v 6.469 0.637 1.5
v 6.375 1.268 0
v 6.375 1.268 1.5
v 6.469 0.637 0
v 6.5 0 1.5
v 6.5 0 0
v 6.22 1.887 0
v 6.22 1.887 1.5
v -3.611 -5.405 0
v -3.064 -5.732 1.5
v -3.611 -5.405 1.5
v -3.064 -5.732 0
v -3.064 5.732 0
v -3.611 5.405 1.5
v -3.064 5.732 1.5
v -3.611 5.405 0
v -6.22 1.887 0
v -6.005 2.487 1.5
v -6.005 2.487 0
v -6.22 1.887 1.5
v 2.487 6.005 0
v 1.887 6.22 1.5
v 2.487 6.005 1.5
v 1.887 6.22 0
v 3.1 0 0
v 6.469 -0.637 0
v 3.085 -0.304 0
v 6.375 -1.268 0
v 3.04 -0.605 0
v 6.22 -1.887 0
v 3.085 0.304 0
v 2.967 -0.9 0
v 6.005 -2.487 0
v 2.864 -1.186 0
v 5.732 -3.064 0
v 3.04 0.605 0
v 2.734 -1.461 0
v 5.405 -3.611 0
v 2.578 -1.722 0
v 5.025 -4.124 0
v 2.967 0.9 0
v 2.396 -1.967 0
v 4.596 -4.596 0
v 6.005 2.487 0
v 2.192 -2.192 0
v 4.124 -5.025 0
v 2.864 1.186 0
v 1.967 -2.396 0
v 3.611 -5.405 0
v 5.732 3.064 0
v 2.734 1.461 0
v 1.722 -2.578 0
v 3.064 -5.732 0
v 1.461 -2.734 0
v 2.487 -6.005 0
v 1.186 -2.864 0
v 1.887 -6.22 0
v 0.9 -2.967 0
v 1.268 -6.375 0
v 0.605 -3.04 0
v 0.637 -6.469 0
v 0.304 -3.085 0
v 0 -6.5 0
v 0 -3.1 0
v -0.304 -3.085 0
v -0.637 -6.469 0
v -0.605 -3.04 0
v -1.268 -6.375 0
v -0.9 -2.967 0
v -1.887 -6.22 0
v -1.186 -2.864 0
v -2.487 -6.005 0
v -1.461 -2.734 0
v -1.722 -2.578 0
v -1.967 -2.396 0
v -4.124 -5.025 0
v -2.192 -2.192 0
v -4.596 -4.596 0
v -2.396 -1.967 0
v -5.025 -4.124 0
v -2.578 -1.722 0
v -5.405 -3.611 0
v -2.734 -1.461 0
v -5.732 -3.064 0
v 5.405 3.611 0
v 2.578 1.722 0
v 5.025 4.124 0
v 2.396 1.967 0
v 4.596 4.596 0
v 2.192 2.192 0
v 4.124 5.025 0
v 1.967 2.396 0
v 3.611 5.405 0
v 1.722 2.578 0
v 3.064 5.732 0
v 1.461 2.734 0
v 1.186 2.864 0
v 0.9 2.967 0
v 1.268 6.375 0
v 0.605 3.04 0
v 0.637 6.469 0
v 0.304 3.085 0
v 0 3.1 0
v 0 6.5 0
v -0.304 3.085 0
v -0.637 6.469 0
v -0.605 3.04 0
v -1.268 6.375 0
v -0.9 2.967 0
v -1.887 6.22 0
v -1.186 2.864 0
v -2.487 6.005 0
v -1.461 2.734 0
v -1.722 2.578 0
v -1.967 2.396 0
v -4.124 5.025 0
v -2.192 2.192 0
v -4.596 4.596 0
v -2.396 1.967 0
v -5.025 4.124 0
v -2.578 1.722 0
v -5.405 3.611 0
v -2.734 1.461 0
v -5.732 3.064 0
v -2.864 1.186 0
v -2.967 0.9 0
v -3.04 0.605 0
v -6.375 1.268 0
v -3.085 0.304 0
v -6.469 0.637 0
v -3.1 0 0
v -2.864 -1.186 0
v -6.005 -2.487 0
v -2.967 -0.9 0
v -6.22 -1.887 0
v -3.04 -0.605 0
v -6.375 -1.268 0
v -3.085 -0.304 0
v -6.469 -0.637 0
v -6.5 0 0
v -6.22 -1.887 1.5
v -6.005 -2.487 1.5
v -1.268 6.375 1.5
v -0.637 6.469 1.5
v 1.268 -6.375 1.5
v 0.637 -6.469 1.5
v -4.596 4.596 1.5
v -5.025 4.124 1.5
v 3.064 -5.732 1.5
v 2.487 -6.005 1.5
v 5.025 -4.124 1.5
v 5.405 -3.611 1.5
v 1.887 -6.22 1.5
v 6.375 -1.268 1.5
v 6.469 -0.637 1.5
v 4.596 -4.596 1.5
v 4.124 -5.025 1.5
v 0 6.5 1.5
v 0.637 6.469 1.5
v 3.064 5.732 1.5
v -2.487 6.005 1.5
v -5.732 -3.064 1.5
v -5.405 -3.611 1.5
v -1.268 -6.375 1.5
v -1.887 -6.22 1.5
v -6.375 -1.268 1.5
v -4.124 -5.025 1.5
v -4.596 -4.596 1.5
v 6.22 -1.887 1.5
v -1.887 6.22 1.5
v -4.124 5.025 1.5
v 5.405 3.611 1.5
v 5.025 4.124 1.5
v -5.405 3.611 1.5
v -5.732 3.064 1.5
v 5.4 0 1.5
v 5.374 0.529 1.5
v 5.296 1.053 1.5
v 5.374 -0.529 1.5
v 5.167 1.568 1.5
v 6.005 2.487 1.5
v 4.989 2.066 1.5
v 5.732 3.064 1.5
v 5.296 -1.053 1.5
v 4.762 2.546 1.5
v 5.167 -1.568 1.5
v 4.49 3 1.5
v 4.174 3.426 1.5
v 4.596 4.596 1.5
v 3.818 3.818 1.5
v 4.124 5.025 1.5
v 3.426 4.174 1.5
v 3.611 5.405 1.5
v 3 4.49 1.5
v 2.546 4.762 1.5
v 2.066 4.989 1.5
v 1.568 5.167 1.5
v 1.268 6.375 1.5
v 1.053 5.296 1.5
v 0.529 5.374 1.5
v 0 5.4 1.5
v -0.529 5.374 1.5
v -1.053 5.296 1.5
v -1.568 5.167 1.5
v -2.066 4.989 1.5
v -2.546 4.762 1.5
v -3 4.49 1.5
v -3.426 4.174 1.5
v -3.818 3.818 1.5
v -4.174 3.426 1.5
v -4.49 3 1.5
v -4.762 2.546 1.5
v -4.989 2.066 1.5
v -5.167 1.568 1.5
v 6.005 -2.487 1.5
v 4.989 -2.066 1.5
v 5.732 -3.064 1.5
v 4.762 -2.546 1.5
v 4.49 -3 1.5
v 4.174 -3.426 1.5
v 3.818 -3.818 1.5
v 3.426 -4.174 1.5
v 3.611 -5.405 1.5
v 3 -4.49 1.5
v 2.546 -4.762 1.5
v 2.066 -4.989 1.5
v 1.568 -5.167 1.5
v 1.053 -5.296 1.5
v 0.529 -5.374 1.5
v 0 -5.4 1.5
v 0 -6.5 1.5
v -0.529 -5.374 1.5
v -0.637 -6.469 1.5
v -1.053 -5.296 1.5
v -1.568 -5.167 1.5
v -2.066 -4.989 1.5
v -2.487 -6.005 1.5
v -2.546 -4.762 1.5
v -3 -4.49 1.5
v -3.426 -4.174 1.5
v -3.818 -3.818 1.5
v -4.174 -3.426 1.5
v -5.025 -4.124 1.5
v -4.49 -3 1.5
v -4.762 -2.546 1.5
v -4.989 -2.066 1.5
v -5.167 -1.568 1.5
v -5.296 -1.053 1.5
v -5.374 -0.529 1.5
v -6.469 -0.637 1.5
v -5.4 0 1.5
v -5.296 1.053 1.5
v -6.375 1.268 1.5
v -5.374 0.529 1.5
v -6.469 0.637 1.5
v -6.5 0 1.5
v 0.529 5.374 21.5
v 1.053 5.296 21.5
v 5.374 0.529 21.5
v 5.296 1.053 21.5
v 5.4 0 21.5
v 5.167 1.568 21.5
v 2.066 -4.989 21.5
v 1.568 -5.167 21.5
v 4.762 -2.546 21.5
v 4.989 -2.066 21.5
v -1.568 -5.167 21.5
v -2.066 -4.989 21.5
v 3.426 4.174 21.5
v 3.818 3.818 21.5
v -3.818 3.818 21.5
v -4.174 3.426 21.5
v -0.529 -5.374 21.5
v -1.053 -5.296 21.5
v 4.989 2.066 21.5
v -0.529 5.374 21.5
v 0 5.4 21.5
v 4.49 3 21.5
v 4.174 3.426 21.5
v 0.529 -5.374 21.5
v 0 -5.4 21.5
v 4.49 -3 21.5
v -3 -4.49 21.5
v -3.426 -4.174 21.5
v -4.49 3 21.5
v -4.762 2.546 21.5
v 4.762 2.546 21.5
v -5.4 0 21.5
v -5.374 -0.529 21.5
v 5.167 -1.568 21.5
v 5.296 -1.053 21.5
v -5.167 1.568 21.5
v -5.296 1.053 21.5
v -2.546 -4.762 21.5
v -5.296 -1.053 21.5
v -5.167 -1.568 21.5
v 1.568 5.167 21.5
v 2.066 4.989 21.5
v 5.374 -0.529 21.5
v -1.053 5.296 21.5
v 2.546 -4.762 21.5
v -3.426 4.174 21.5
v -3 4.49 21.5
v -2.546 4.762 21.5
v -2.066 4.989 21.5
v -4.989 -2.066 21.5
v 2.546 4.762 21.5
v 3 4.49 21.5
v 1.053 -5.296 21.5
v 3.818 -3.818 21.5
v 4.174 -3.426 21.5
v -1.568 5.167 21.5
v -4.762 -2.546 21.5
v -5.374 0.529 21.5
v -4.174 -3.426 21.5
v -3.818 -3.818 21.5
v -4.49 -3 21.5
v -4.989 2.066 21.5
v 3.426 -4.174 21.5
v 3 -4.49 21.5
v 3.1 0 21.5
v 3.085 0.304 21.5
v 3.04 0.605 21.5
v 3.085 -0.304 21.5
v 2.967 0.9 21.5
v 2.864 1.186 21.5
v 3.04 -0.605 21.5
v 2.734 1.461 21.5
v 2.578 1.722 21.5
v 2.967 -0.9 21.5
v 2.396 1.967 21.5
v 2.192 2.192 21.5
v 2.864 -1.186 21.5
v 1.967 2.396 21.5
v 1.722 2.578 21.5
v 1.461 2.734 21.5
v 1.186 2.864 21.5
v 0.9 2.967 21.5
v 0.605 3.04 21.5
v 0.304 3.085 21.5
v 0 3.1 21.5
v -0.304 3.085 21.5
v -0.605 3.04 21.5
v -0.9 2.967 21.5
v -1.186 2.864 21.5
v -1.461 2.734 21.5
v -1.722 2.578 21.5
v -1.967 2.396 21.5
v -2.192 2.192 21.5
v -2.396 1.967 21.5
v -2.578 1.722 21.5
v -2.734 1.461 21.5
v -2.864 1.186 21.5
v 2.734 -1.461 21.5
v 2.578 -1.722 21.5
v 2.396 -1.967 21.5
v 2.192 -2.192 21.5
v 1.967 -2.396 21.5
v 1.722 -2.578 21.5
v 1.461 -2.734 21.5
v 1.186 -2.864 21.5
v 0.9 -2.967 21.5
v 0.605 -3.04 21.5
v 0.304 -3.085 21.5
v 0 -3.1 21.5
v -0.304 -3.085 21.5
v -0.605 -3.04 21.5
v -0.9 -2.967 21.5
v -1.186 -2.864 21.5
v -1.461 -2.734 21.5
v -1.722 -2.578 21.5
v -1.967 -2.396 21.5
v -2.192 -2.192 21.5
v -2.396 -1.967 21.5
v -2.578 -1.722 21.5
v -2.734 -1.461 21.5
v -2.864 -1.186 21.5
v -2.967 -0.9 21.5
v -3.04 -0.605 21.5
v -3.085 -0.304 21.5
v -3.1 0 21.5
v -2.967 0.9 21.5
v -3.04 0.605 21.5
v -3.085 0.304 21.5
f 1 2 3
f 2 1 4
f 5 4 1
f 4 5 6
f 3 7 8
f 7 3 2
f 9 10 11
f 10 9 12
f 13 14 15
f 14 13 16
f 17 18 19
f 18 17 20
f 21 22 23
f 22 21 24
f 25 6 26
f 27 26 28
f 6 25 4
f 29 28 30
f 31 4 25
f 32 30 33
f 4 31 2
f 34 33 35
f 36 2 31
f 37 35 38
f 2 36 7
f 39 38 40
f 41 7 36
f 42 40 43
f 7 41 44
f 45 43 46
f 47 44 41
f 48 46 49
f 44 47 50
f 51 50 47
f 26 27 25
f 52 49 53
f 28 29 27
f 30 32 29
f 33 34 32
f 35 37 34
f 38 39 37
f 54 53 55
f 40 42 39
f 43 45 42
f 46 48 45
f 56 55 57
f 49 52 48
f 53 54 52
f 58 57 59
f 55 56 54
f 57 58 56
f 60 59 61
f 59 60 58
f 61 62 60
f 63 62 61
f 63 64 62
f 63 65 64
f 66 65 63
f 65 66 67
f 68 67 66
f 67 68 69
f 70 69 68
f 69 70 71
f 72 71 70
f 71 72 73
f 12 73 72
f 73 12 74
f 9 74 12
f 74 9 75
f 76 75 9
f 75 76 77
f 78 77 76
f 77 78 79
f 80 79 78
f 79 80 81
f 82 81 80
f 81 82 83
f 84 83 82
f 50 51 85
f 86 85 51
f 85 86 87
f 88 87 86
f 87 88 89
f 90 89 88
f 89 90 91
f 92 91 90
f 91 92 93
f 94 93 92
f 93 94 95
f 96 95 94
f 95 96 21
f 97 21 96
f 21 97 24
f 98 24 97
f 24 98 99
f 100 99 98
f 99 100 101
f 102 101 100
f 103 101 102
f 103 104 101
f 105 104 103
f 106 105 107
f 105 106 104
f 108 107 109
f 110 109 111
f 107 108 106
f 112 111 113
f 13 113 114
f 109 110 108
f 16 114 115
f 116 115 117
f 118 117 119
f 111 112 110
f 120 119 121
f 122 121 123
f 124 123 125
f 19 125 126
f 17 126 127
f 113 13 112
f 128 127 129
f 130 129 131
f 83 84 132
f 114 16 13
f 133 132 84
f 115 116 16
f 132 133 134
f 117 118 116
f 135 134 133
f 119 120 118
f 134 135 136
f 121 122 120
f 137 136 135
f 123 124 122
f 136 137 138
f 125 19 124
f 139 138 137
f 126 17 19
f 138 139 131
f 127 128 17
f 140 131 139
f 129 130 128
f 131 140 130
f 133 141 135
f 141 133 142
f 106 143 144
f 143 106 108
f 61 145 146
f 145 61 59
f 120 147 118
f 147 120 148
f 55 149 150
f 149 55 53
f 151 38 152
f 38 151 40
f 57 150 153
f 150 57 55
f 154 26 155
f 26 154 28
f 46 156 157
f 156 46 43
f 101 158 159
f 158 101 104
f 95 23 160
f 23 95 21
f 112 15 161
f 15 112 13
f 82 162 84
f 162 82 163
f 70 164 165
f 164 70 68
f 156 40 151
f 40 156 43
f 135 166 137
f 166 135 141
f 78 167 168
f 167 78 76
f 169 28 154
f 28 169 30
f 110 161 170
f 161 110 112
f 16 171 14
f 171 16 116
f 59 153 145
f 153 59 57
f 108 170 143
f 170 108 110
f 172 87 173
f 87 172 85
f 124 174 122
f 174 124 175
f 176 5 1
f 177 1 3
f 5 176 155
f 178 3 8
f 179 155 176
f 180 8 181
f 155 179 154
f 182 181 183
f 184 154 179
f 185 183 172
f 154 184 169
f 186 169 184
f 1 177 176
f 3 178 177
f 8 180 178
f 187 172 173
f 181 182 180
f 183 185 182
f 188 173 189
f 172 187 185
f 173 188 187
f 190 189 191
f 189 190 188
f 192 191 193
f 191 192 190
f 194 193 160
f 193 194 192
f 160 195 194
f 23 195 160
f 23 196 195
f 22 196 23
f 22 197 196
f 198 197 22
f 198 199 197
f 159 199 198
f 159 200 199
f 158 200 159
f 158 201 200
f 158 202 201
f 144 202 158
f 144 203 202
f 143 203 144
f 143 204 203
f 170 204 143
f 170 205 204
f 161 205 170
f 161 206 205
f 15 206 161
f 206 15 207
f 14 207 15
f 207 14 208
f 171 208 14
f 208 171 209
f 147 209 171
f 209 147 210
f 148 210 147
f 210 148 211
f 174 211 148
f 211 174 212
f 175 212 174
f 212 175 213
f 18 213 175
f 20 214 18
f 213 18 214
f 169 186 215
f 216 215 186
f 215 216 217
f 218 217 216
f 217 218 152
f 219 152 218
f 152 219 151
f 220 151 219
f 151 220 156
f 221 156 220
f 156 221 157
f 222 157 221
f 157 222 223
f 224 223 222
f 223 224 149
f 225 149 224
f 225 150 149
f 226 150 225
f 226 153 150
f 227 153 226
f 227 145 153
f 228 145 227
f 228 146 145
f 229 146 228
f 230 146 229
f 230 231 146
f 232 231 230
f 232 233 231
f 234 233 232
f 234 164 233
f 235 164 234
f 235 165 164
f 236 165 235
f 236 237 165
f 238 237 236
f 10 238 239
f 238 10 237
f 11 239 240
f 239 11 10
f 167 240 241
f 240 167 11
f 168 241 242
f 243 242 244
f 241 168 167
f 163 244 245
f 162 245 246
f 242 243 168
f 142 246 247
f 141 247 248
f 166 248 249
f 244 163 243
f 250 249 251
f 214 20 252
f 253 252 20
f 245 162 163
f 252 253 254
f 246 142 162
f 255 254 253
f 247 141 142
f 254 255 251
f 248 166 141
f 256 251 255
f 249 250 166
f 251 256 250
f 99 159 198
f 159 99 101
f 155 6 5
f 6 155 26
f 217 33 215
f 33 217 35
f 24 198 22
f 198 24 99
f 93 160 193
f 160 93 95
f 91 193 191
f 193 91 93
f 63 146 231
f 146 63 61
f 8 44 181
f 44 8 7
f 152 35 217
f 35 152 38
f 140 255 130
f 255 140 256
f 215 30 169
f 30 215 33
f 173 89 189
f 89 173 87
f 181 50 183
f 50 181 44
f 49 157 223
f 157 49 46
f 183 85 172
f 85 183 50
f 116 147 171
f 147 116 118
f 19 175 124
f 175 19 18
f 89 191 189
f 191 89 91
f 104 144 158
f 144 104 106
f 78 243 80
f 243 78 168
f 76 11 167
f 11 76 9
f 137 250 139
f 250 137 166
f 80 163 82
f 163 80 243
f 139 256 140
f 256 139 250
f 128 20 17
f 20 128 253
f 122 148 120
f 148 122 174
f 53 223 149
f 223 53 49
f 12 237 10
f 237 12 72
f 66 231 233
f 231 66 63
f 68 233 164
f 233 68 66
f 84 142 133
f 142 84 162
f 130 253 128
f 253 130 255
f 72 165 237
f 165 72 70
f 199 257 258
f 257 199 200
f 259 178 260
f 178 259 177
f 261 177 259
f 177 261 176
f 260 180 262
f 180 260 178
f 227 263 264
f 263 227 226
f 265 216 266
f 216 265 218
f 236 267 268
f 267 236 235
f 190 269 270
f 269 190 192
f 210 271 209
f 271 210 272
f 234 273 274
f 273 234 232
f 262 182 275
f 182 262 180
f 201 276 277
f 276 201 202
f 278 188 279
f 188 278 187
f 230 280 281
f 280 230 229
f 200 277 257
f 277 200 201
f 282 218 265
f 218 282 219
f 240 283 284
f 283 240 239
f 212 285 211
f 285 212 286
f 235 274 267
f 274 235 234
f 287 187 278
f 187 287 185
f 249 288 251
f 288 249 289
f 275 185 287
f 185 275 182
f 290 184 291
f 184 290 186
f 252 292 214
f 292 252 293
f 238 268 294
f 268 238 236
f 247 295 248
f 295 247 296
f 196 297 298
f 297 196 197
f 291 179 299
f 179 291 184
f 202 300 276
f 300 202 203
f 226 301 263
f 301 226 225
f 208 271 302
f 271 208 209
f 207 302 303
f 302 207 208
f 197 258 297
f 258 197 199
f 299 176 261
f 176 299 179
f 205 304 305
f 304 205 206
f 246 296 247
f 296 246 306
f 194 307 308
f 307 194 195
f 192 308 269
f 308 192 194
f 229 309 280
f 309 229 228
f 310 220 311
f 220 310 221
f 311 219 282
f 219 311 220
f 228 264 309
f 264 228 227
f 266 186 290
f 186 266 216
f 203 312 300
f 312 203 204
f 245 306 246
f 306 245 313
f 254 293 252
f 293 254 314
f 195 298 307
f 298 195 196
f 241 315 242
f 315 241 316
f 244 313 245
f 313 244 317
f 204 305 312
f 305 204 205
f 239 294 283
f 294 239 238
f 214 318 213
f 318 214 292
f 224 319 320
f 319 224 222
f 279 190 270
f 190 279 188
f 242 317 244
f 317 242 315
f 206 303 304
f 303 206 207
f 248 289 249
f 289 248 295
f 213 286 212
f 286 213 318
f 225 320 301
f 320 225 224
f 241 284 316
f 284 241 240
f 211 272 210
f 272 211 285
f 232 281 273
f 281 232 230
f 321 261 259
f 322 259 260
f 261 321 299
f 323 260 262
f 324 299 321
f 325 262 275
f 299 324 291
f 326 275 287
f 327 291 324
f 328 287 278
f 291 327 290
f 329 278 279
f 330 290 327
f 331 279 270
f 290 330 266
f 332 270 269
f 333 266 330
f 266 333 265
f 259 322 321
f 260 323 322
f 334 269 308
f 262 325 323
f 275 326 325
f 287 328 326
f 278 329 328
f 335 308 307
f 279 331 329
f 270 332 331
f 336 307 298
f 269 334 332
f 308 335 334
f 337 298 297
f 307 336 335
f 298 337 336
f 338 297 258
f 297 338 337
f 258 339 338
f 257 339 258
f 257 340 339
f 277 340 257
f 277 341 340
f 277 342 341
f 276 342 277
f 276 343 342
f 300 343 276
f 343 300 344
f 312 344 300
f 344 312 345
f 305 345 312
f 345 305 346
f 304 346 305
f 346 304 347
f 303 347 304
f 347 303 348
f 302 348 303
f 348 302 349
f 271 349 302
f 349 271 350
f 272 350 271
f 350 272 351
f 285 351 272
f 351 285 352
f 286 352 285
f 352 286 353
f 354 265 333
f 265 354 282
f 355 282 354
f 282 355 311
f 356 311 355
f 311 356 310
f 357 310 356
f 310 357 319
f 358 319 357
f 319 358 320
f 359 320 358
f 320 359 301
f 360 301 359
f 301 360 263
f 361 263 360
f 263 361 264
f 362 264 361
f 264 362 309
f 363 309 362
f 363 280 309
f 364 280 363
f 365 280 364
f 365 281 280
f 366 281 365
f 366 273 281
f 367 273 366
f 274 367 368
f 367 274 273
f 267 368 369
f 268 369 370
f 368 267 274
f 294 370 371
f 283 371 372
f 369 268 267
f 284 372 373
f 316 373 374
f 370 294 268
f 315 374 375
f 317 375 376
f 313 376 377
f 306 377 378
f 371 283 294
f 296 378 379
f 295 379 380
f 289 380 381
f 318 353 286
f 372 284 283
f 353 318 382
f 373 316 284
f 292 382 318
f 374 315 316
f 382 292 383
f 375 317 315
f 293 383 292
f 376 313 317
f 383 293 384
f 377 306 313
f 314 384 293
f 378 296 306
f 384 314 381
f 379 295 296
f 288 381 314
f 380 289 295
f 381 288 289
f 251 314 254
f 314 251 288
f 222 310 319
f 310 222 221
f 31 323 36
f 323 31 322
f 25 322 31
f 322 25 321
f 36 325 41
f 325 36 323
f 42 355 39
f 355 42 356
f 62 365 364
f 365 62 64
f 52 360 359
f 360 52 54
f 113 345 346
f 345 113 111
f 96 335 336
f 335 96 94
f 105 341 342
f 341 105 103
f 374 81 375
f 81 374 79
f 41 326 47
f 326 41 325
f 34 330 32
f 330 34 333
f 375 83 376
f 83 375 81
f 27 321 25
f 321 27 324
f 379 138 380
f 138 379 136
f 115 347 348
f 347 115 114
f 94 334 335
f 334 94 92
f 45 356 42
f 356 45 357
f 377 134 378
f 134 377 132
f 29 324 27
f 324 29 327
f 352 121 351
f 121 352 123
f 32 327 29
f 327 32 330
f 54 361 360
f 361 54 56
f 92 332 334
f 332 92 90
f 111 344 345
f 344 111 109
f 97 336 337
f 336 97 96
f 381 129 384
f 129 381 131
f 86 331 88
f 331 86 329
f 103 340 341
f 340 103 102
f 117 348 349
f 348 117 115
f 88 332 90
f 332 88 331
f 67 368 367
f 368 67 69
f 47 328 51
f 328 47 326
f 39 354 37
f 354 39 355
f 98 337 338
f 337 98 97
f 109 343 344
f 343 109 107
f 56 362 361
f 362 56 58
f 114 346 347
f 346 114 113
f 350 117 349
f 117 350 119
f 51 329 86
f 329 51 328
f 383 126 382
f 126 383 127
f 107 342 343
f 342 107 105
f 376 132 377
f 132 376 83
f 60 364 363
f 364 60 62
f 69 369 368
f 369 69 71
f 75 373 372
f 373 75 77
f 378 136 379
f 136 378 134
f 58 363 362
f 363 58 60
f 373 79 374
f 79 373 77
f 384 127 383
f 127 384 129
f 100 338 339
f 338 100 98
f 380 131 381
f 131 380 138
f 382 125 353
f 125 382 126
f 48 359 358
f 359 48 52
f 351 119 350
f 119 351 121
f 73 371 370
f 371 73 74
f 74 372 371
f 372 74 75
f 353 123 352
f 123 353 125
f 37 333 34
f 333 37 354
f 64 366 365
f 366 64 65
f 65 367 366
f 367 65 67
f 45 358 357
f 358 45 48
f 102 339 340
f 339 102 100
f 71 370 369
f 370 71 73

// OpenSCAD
// Adapter sleeve: 0.2 mL PCR tube in a 1.5 mL tube rack hole
// Print orientation: collar down on the bed, sleeve body pointing up (+Z)

$fn = 64;

// ---- Dimensions (mm) ----
collar_d      = 13;    // collar outer diameter
collar_h      = 1.5;   // collar thickness (z = 0 to 1.5)
sleeve_od     = 10.8;  // sleeve body outer diameter
sleeve_top_z  = 21.5;  // top of sleeve body (z = 1.5 + 20)
bore_d        = 6.2;   // through-bore diameter
eps           = 0.5;   // cutter overshoot past faces

// ---- Derived ----
sleeve_len = sleeve_top_z - collar_h; // 20 mm body length

difference() {
    union() {
        // Collar
        cylinder(d = collar_d, h = collar_h);
        // Sleeve body (slightly overlapping the collar for a clean union)
        translate([0, 0, collar_h - 0.01])
            cylinder(d = sleeve_od, h = sleeve_len + 0.01);
    }
    // Straight through-bore
    translate([0, 0, -eps])
        cylinder(d = bore_d, h = sleeve_top_z + 2 * eps);
}
